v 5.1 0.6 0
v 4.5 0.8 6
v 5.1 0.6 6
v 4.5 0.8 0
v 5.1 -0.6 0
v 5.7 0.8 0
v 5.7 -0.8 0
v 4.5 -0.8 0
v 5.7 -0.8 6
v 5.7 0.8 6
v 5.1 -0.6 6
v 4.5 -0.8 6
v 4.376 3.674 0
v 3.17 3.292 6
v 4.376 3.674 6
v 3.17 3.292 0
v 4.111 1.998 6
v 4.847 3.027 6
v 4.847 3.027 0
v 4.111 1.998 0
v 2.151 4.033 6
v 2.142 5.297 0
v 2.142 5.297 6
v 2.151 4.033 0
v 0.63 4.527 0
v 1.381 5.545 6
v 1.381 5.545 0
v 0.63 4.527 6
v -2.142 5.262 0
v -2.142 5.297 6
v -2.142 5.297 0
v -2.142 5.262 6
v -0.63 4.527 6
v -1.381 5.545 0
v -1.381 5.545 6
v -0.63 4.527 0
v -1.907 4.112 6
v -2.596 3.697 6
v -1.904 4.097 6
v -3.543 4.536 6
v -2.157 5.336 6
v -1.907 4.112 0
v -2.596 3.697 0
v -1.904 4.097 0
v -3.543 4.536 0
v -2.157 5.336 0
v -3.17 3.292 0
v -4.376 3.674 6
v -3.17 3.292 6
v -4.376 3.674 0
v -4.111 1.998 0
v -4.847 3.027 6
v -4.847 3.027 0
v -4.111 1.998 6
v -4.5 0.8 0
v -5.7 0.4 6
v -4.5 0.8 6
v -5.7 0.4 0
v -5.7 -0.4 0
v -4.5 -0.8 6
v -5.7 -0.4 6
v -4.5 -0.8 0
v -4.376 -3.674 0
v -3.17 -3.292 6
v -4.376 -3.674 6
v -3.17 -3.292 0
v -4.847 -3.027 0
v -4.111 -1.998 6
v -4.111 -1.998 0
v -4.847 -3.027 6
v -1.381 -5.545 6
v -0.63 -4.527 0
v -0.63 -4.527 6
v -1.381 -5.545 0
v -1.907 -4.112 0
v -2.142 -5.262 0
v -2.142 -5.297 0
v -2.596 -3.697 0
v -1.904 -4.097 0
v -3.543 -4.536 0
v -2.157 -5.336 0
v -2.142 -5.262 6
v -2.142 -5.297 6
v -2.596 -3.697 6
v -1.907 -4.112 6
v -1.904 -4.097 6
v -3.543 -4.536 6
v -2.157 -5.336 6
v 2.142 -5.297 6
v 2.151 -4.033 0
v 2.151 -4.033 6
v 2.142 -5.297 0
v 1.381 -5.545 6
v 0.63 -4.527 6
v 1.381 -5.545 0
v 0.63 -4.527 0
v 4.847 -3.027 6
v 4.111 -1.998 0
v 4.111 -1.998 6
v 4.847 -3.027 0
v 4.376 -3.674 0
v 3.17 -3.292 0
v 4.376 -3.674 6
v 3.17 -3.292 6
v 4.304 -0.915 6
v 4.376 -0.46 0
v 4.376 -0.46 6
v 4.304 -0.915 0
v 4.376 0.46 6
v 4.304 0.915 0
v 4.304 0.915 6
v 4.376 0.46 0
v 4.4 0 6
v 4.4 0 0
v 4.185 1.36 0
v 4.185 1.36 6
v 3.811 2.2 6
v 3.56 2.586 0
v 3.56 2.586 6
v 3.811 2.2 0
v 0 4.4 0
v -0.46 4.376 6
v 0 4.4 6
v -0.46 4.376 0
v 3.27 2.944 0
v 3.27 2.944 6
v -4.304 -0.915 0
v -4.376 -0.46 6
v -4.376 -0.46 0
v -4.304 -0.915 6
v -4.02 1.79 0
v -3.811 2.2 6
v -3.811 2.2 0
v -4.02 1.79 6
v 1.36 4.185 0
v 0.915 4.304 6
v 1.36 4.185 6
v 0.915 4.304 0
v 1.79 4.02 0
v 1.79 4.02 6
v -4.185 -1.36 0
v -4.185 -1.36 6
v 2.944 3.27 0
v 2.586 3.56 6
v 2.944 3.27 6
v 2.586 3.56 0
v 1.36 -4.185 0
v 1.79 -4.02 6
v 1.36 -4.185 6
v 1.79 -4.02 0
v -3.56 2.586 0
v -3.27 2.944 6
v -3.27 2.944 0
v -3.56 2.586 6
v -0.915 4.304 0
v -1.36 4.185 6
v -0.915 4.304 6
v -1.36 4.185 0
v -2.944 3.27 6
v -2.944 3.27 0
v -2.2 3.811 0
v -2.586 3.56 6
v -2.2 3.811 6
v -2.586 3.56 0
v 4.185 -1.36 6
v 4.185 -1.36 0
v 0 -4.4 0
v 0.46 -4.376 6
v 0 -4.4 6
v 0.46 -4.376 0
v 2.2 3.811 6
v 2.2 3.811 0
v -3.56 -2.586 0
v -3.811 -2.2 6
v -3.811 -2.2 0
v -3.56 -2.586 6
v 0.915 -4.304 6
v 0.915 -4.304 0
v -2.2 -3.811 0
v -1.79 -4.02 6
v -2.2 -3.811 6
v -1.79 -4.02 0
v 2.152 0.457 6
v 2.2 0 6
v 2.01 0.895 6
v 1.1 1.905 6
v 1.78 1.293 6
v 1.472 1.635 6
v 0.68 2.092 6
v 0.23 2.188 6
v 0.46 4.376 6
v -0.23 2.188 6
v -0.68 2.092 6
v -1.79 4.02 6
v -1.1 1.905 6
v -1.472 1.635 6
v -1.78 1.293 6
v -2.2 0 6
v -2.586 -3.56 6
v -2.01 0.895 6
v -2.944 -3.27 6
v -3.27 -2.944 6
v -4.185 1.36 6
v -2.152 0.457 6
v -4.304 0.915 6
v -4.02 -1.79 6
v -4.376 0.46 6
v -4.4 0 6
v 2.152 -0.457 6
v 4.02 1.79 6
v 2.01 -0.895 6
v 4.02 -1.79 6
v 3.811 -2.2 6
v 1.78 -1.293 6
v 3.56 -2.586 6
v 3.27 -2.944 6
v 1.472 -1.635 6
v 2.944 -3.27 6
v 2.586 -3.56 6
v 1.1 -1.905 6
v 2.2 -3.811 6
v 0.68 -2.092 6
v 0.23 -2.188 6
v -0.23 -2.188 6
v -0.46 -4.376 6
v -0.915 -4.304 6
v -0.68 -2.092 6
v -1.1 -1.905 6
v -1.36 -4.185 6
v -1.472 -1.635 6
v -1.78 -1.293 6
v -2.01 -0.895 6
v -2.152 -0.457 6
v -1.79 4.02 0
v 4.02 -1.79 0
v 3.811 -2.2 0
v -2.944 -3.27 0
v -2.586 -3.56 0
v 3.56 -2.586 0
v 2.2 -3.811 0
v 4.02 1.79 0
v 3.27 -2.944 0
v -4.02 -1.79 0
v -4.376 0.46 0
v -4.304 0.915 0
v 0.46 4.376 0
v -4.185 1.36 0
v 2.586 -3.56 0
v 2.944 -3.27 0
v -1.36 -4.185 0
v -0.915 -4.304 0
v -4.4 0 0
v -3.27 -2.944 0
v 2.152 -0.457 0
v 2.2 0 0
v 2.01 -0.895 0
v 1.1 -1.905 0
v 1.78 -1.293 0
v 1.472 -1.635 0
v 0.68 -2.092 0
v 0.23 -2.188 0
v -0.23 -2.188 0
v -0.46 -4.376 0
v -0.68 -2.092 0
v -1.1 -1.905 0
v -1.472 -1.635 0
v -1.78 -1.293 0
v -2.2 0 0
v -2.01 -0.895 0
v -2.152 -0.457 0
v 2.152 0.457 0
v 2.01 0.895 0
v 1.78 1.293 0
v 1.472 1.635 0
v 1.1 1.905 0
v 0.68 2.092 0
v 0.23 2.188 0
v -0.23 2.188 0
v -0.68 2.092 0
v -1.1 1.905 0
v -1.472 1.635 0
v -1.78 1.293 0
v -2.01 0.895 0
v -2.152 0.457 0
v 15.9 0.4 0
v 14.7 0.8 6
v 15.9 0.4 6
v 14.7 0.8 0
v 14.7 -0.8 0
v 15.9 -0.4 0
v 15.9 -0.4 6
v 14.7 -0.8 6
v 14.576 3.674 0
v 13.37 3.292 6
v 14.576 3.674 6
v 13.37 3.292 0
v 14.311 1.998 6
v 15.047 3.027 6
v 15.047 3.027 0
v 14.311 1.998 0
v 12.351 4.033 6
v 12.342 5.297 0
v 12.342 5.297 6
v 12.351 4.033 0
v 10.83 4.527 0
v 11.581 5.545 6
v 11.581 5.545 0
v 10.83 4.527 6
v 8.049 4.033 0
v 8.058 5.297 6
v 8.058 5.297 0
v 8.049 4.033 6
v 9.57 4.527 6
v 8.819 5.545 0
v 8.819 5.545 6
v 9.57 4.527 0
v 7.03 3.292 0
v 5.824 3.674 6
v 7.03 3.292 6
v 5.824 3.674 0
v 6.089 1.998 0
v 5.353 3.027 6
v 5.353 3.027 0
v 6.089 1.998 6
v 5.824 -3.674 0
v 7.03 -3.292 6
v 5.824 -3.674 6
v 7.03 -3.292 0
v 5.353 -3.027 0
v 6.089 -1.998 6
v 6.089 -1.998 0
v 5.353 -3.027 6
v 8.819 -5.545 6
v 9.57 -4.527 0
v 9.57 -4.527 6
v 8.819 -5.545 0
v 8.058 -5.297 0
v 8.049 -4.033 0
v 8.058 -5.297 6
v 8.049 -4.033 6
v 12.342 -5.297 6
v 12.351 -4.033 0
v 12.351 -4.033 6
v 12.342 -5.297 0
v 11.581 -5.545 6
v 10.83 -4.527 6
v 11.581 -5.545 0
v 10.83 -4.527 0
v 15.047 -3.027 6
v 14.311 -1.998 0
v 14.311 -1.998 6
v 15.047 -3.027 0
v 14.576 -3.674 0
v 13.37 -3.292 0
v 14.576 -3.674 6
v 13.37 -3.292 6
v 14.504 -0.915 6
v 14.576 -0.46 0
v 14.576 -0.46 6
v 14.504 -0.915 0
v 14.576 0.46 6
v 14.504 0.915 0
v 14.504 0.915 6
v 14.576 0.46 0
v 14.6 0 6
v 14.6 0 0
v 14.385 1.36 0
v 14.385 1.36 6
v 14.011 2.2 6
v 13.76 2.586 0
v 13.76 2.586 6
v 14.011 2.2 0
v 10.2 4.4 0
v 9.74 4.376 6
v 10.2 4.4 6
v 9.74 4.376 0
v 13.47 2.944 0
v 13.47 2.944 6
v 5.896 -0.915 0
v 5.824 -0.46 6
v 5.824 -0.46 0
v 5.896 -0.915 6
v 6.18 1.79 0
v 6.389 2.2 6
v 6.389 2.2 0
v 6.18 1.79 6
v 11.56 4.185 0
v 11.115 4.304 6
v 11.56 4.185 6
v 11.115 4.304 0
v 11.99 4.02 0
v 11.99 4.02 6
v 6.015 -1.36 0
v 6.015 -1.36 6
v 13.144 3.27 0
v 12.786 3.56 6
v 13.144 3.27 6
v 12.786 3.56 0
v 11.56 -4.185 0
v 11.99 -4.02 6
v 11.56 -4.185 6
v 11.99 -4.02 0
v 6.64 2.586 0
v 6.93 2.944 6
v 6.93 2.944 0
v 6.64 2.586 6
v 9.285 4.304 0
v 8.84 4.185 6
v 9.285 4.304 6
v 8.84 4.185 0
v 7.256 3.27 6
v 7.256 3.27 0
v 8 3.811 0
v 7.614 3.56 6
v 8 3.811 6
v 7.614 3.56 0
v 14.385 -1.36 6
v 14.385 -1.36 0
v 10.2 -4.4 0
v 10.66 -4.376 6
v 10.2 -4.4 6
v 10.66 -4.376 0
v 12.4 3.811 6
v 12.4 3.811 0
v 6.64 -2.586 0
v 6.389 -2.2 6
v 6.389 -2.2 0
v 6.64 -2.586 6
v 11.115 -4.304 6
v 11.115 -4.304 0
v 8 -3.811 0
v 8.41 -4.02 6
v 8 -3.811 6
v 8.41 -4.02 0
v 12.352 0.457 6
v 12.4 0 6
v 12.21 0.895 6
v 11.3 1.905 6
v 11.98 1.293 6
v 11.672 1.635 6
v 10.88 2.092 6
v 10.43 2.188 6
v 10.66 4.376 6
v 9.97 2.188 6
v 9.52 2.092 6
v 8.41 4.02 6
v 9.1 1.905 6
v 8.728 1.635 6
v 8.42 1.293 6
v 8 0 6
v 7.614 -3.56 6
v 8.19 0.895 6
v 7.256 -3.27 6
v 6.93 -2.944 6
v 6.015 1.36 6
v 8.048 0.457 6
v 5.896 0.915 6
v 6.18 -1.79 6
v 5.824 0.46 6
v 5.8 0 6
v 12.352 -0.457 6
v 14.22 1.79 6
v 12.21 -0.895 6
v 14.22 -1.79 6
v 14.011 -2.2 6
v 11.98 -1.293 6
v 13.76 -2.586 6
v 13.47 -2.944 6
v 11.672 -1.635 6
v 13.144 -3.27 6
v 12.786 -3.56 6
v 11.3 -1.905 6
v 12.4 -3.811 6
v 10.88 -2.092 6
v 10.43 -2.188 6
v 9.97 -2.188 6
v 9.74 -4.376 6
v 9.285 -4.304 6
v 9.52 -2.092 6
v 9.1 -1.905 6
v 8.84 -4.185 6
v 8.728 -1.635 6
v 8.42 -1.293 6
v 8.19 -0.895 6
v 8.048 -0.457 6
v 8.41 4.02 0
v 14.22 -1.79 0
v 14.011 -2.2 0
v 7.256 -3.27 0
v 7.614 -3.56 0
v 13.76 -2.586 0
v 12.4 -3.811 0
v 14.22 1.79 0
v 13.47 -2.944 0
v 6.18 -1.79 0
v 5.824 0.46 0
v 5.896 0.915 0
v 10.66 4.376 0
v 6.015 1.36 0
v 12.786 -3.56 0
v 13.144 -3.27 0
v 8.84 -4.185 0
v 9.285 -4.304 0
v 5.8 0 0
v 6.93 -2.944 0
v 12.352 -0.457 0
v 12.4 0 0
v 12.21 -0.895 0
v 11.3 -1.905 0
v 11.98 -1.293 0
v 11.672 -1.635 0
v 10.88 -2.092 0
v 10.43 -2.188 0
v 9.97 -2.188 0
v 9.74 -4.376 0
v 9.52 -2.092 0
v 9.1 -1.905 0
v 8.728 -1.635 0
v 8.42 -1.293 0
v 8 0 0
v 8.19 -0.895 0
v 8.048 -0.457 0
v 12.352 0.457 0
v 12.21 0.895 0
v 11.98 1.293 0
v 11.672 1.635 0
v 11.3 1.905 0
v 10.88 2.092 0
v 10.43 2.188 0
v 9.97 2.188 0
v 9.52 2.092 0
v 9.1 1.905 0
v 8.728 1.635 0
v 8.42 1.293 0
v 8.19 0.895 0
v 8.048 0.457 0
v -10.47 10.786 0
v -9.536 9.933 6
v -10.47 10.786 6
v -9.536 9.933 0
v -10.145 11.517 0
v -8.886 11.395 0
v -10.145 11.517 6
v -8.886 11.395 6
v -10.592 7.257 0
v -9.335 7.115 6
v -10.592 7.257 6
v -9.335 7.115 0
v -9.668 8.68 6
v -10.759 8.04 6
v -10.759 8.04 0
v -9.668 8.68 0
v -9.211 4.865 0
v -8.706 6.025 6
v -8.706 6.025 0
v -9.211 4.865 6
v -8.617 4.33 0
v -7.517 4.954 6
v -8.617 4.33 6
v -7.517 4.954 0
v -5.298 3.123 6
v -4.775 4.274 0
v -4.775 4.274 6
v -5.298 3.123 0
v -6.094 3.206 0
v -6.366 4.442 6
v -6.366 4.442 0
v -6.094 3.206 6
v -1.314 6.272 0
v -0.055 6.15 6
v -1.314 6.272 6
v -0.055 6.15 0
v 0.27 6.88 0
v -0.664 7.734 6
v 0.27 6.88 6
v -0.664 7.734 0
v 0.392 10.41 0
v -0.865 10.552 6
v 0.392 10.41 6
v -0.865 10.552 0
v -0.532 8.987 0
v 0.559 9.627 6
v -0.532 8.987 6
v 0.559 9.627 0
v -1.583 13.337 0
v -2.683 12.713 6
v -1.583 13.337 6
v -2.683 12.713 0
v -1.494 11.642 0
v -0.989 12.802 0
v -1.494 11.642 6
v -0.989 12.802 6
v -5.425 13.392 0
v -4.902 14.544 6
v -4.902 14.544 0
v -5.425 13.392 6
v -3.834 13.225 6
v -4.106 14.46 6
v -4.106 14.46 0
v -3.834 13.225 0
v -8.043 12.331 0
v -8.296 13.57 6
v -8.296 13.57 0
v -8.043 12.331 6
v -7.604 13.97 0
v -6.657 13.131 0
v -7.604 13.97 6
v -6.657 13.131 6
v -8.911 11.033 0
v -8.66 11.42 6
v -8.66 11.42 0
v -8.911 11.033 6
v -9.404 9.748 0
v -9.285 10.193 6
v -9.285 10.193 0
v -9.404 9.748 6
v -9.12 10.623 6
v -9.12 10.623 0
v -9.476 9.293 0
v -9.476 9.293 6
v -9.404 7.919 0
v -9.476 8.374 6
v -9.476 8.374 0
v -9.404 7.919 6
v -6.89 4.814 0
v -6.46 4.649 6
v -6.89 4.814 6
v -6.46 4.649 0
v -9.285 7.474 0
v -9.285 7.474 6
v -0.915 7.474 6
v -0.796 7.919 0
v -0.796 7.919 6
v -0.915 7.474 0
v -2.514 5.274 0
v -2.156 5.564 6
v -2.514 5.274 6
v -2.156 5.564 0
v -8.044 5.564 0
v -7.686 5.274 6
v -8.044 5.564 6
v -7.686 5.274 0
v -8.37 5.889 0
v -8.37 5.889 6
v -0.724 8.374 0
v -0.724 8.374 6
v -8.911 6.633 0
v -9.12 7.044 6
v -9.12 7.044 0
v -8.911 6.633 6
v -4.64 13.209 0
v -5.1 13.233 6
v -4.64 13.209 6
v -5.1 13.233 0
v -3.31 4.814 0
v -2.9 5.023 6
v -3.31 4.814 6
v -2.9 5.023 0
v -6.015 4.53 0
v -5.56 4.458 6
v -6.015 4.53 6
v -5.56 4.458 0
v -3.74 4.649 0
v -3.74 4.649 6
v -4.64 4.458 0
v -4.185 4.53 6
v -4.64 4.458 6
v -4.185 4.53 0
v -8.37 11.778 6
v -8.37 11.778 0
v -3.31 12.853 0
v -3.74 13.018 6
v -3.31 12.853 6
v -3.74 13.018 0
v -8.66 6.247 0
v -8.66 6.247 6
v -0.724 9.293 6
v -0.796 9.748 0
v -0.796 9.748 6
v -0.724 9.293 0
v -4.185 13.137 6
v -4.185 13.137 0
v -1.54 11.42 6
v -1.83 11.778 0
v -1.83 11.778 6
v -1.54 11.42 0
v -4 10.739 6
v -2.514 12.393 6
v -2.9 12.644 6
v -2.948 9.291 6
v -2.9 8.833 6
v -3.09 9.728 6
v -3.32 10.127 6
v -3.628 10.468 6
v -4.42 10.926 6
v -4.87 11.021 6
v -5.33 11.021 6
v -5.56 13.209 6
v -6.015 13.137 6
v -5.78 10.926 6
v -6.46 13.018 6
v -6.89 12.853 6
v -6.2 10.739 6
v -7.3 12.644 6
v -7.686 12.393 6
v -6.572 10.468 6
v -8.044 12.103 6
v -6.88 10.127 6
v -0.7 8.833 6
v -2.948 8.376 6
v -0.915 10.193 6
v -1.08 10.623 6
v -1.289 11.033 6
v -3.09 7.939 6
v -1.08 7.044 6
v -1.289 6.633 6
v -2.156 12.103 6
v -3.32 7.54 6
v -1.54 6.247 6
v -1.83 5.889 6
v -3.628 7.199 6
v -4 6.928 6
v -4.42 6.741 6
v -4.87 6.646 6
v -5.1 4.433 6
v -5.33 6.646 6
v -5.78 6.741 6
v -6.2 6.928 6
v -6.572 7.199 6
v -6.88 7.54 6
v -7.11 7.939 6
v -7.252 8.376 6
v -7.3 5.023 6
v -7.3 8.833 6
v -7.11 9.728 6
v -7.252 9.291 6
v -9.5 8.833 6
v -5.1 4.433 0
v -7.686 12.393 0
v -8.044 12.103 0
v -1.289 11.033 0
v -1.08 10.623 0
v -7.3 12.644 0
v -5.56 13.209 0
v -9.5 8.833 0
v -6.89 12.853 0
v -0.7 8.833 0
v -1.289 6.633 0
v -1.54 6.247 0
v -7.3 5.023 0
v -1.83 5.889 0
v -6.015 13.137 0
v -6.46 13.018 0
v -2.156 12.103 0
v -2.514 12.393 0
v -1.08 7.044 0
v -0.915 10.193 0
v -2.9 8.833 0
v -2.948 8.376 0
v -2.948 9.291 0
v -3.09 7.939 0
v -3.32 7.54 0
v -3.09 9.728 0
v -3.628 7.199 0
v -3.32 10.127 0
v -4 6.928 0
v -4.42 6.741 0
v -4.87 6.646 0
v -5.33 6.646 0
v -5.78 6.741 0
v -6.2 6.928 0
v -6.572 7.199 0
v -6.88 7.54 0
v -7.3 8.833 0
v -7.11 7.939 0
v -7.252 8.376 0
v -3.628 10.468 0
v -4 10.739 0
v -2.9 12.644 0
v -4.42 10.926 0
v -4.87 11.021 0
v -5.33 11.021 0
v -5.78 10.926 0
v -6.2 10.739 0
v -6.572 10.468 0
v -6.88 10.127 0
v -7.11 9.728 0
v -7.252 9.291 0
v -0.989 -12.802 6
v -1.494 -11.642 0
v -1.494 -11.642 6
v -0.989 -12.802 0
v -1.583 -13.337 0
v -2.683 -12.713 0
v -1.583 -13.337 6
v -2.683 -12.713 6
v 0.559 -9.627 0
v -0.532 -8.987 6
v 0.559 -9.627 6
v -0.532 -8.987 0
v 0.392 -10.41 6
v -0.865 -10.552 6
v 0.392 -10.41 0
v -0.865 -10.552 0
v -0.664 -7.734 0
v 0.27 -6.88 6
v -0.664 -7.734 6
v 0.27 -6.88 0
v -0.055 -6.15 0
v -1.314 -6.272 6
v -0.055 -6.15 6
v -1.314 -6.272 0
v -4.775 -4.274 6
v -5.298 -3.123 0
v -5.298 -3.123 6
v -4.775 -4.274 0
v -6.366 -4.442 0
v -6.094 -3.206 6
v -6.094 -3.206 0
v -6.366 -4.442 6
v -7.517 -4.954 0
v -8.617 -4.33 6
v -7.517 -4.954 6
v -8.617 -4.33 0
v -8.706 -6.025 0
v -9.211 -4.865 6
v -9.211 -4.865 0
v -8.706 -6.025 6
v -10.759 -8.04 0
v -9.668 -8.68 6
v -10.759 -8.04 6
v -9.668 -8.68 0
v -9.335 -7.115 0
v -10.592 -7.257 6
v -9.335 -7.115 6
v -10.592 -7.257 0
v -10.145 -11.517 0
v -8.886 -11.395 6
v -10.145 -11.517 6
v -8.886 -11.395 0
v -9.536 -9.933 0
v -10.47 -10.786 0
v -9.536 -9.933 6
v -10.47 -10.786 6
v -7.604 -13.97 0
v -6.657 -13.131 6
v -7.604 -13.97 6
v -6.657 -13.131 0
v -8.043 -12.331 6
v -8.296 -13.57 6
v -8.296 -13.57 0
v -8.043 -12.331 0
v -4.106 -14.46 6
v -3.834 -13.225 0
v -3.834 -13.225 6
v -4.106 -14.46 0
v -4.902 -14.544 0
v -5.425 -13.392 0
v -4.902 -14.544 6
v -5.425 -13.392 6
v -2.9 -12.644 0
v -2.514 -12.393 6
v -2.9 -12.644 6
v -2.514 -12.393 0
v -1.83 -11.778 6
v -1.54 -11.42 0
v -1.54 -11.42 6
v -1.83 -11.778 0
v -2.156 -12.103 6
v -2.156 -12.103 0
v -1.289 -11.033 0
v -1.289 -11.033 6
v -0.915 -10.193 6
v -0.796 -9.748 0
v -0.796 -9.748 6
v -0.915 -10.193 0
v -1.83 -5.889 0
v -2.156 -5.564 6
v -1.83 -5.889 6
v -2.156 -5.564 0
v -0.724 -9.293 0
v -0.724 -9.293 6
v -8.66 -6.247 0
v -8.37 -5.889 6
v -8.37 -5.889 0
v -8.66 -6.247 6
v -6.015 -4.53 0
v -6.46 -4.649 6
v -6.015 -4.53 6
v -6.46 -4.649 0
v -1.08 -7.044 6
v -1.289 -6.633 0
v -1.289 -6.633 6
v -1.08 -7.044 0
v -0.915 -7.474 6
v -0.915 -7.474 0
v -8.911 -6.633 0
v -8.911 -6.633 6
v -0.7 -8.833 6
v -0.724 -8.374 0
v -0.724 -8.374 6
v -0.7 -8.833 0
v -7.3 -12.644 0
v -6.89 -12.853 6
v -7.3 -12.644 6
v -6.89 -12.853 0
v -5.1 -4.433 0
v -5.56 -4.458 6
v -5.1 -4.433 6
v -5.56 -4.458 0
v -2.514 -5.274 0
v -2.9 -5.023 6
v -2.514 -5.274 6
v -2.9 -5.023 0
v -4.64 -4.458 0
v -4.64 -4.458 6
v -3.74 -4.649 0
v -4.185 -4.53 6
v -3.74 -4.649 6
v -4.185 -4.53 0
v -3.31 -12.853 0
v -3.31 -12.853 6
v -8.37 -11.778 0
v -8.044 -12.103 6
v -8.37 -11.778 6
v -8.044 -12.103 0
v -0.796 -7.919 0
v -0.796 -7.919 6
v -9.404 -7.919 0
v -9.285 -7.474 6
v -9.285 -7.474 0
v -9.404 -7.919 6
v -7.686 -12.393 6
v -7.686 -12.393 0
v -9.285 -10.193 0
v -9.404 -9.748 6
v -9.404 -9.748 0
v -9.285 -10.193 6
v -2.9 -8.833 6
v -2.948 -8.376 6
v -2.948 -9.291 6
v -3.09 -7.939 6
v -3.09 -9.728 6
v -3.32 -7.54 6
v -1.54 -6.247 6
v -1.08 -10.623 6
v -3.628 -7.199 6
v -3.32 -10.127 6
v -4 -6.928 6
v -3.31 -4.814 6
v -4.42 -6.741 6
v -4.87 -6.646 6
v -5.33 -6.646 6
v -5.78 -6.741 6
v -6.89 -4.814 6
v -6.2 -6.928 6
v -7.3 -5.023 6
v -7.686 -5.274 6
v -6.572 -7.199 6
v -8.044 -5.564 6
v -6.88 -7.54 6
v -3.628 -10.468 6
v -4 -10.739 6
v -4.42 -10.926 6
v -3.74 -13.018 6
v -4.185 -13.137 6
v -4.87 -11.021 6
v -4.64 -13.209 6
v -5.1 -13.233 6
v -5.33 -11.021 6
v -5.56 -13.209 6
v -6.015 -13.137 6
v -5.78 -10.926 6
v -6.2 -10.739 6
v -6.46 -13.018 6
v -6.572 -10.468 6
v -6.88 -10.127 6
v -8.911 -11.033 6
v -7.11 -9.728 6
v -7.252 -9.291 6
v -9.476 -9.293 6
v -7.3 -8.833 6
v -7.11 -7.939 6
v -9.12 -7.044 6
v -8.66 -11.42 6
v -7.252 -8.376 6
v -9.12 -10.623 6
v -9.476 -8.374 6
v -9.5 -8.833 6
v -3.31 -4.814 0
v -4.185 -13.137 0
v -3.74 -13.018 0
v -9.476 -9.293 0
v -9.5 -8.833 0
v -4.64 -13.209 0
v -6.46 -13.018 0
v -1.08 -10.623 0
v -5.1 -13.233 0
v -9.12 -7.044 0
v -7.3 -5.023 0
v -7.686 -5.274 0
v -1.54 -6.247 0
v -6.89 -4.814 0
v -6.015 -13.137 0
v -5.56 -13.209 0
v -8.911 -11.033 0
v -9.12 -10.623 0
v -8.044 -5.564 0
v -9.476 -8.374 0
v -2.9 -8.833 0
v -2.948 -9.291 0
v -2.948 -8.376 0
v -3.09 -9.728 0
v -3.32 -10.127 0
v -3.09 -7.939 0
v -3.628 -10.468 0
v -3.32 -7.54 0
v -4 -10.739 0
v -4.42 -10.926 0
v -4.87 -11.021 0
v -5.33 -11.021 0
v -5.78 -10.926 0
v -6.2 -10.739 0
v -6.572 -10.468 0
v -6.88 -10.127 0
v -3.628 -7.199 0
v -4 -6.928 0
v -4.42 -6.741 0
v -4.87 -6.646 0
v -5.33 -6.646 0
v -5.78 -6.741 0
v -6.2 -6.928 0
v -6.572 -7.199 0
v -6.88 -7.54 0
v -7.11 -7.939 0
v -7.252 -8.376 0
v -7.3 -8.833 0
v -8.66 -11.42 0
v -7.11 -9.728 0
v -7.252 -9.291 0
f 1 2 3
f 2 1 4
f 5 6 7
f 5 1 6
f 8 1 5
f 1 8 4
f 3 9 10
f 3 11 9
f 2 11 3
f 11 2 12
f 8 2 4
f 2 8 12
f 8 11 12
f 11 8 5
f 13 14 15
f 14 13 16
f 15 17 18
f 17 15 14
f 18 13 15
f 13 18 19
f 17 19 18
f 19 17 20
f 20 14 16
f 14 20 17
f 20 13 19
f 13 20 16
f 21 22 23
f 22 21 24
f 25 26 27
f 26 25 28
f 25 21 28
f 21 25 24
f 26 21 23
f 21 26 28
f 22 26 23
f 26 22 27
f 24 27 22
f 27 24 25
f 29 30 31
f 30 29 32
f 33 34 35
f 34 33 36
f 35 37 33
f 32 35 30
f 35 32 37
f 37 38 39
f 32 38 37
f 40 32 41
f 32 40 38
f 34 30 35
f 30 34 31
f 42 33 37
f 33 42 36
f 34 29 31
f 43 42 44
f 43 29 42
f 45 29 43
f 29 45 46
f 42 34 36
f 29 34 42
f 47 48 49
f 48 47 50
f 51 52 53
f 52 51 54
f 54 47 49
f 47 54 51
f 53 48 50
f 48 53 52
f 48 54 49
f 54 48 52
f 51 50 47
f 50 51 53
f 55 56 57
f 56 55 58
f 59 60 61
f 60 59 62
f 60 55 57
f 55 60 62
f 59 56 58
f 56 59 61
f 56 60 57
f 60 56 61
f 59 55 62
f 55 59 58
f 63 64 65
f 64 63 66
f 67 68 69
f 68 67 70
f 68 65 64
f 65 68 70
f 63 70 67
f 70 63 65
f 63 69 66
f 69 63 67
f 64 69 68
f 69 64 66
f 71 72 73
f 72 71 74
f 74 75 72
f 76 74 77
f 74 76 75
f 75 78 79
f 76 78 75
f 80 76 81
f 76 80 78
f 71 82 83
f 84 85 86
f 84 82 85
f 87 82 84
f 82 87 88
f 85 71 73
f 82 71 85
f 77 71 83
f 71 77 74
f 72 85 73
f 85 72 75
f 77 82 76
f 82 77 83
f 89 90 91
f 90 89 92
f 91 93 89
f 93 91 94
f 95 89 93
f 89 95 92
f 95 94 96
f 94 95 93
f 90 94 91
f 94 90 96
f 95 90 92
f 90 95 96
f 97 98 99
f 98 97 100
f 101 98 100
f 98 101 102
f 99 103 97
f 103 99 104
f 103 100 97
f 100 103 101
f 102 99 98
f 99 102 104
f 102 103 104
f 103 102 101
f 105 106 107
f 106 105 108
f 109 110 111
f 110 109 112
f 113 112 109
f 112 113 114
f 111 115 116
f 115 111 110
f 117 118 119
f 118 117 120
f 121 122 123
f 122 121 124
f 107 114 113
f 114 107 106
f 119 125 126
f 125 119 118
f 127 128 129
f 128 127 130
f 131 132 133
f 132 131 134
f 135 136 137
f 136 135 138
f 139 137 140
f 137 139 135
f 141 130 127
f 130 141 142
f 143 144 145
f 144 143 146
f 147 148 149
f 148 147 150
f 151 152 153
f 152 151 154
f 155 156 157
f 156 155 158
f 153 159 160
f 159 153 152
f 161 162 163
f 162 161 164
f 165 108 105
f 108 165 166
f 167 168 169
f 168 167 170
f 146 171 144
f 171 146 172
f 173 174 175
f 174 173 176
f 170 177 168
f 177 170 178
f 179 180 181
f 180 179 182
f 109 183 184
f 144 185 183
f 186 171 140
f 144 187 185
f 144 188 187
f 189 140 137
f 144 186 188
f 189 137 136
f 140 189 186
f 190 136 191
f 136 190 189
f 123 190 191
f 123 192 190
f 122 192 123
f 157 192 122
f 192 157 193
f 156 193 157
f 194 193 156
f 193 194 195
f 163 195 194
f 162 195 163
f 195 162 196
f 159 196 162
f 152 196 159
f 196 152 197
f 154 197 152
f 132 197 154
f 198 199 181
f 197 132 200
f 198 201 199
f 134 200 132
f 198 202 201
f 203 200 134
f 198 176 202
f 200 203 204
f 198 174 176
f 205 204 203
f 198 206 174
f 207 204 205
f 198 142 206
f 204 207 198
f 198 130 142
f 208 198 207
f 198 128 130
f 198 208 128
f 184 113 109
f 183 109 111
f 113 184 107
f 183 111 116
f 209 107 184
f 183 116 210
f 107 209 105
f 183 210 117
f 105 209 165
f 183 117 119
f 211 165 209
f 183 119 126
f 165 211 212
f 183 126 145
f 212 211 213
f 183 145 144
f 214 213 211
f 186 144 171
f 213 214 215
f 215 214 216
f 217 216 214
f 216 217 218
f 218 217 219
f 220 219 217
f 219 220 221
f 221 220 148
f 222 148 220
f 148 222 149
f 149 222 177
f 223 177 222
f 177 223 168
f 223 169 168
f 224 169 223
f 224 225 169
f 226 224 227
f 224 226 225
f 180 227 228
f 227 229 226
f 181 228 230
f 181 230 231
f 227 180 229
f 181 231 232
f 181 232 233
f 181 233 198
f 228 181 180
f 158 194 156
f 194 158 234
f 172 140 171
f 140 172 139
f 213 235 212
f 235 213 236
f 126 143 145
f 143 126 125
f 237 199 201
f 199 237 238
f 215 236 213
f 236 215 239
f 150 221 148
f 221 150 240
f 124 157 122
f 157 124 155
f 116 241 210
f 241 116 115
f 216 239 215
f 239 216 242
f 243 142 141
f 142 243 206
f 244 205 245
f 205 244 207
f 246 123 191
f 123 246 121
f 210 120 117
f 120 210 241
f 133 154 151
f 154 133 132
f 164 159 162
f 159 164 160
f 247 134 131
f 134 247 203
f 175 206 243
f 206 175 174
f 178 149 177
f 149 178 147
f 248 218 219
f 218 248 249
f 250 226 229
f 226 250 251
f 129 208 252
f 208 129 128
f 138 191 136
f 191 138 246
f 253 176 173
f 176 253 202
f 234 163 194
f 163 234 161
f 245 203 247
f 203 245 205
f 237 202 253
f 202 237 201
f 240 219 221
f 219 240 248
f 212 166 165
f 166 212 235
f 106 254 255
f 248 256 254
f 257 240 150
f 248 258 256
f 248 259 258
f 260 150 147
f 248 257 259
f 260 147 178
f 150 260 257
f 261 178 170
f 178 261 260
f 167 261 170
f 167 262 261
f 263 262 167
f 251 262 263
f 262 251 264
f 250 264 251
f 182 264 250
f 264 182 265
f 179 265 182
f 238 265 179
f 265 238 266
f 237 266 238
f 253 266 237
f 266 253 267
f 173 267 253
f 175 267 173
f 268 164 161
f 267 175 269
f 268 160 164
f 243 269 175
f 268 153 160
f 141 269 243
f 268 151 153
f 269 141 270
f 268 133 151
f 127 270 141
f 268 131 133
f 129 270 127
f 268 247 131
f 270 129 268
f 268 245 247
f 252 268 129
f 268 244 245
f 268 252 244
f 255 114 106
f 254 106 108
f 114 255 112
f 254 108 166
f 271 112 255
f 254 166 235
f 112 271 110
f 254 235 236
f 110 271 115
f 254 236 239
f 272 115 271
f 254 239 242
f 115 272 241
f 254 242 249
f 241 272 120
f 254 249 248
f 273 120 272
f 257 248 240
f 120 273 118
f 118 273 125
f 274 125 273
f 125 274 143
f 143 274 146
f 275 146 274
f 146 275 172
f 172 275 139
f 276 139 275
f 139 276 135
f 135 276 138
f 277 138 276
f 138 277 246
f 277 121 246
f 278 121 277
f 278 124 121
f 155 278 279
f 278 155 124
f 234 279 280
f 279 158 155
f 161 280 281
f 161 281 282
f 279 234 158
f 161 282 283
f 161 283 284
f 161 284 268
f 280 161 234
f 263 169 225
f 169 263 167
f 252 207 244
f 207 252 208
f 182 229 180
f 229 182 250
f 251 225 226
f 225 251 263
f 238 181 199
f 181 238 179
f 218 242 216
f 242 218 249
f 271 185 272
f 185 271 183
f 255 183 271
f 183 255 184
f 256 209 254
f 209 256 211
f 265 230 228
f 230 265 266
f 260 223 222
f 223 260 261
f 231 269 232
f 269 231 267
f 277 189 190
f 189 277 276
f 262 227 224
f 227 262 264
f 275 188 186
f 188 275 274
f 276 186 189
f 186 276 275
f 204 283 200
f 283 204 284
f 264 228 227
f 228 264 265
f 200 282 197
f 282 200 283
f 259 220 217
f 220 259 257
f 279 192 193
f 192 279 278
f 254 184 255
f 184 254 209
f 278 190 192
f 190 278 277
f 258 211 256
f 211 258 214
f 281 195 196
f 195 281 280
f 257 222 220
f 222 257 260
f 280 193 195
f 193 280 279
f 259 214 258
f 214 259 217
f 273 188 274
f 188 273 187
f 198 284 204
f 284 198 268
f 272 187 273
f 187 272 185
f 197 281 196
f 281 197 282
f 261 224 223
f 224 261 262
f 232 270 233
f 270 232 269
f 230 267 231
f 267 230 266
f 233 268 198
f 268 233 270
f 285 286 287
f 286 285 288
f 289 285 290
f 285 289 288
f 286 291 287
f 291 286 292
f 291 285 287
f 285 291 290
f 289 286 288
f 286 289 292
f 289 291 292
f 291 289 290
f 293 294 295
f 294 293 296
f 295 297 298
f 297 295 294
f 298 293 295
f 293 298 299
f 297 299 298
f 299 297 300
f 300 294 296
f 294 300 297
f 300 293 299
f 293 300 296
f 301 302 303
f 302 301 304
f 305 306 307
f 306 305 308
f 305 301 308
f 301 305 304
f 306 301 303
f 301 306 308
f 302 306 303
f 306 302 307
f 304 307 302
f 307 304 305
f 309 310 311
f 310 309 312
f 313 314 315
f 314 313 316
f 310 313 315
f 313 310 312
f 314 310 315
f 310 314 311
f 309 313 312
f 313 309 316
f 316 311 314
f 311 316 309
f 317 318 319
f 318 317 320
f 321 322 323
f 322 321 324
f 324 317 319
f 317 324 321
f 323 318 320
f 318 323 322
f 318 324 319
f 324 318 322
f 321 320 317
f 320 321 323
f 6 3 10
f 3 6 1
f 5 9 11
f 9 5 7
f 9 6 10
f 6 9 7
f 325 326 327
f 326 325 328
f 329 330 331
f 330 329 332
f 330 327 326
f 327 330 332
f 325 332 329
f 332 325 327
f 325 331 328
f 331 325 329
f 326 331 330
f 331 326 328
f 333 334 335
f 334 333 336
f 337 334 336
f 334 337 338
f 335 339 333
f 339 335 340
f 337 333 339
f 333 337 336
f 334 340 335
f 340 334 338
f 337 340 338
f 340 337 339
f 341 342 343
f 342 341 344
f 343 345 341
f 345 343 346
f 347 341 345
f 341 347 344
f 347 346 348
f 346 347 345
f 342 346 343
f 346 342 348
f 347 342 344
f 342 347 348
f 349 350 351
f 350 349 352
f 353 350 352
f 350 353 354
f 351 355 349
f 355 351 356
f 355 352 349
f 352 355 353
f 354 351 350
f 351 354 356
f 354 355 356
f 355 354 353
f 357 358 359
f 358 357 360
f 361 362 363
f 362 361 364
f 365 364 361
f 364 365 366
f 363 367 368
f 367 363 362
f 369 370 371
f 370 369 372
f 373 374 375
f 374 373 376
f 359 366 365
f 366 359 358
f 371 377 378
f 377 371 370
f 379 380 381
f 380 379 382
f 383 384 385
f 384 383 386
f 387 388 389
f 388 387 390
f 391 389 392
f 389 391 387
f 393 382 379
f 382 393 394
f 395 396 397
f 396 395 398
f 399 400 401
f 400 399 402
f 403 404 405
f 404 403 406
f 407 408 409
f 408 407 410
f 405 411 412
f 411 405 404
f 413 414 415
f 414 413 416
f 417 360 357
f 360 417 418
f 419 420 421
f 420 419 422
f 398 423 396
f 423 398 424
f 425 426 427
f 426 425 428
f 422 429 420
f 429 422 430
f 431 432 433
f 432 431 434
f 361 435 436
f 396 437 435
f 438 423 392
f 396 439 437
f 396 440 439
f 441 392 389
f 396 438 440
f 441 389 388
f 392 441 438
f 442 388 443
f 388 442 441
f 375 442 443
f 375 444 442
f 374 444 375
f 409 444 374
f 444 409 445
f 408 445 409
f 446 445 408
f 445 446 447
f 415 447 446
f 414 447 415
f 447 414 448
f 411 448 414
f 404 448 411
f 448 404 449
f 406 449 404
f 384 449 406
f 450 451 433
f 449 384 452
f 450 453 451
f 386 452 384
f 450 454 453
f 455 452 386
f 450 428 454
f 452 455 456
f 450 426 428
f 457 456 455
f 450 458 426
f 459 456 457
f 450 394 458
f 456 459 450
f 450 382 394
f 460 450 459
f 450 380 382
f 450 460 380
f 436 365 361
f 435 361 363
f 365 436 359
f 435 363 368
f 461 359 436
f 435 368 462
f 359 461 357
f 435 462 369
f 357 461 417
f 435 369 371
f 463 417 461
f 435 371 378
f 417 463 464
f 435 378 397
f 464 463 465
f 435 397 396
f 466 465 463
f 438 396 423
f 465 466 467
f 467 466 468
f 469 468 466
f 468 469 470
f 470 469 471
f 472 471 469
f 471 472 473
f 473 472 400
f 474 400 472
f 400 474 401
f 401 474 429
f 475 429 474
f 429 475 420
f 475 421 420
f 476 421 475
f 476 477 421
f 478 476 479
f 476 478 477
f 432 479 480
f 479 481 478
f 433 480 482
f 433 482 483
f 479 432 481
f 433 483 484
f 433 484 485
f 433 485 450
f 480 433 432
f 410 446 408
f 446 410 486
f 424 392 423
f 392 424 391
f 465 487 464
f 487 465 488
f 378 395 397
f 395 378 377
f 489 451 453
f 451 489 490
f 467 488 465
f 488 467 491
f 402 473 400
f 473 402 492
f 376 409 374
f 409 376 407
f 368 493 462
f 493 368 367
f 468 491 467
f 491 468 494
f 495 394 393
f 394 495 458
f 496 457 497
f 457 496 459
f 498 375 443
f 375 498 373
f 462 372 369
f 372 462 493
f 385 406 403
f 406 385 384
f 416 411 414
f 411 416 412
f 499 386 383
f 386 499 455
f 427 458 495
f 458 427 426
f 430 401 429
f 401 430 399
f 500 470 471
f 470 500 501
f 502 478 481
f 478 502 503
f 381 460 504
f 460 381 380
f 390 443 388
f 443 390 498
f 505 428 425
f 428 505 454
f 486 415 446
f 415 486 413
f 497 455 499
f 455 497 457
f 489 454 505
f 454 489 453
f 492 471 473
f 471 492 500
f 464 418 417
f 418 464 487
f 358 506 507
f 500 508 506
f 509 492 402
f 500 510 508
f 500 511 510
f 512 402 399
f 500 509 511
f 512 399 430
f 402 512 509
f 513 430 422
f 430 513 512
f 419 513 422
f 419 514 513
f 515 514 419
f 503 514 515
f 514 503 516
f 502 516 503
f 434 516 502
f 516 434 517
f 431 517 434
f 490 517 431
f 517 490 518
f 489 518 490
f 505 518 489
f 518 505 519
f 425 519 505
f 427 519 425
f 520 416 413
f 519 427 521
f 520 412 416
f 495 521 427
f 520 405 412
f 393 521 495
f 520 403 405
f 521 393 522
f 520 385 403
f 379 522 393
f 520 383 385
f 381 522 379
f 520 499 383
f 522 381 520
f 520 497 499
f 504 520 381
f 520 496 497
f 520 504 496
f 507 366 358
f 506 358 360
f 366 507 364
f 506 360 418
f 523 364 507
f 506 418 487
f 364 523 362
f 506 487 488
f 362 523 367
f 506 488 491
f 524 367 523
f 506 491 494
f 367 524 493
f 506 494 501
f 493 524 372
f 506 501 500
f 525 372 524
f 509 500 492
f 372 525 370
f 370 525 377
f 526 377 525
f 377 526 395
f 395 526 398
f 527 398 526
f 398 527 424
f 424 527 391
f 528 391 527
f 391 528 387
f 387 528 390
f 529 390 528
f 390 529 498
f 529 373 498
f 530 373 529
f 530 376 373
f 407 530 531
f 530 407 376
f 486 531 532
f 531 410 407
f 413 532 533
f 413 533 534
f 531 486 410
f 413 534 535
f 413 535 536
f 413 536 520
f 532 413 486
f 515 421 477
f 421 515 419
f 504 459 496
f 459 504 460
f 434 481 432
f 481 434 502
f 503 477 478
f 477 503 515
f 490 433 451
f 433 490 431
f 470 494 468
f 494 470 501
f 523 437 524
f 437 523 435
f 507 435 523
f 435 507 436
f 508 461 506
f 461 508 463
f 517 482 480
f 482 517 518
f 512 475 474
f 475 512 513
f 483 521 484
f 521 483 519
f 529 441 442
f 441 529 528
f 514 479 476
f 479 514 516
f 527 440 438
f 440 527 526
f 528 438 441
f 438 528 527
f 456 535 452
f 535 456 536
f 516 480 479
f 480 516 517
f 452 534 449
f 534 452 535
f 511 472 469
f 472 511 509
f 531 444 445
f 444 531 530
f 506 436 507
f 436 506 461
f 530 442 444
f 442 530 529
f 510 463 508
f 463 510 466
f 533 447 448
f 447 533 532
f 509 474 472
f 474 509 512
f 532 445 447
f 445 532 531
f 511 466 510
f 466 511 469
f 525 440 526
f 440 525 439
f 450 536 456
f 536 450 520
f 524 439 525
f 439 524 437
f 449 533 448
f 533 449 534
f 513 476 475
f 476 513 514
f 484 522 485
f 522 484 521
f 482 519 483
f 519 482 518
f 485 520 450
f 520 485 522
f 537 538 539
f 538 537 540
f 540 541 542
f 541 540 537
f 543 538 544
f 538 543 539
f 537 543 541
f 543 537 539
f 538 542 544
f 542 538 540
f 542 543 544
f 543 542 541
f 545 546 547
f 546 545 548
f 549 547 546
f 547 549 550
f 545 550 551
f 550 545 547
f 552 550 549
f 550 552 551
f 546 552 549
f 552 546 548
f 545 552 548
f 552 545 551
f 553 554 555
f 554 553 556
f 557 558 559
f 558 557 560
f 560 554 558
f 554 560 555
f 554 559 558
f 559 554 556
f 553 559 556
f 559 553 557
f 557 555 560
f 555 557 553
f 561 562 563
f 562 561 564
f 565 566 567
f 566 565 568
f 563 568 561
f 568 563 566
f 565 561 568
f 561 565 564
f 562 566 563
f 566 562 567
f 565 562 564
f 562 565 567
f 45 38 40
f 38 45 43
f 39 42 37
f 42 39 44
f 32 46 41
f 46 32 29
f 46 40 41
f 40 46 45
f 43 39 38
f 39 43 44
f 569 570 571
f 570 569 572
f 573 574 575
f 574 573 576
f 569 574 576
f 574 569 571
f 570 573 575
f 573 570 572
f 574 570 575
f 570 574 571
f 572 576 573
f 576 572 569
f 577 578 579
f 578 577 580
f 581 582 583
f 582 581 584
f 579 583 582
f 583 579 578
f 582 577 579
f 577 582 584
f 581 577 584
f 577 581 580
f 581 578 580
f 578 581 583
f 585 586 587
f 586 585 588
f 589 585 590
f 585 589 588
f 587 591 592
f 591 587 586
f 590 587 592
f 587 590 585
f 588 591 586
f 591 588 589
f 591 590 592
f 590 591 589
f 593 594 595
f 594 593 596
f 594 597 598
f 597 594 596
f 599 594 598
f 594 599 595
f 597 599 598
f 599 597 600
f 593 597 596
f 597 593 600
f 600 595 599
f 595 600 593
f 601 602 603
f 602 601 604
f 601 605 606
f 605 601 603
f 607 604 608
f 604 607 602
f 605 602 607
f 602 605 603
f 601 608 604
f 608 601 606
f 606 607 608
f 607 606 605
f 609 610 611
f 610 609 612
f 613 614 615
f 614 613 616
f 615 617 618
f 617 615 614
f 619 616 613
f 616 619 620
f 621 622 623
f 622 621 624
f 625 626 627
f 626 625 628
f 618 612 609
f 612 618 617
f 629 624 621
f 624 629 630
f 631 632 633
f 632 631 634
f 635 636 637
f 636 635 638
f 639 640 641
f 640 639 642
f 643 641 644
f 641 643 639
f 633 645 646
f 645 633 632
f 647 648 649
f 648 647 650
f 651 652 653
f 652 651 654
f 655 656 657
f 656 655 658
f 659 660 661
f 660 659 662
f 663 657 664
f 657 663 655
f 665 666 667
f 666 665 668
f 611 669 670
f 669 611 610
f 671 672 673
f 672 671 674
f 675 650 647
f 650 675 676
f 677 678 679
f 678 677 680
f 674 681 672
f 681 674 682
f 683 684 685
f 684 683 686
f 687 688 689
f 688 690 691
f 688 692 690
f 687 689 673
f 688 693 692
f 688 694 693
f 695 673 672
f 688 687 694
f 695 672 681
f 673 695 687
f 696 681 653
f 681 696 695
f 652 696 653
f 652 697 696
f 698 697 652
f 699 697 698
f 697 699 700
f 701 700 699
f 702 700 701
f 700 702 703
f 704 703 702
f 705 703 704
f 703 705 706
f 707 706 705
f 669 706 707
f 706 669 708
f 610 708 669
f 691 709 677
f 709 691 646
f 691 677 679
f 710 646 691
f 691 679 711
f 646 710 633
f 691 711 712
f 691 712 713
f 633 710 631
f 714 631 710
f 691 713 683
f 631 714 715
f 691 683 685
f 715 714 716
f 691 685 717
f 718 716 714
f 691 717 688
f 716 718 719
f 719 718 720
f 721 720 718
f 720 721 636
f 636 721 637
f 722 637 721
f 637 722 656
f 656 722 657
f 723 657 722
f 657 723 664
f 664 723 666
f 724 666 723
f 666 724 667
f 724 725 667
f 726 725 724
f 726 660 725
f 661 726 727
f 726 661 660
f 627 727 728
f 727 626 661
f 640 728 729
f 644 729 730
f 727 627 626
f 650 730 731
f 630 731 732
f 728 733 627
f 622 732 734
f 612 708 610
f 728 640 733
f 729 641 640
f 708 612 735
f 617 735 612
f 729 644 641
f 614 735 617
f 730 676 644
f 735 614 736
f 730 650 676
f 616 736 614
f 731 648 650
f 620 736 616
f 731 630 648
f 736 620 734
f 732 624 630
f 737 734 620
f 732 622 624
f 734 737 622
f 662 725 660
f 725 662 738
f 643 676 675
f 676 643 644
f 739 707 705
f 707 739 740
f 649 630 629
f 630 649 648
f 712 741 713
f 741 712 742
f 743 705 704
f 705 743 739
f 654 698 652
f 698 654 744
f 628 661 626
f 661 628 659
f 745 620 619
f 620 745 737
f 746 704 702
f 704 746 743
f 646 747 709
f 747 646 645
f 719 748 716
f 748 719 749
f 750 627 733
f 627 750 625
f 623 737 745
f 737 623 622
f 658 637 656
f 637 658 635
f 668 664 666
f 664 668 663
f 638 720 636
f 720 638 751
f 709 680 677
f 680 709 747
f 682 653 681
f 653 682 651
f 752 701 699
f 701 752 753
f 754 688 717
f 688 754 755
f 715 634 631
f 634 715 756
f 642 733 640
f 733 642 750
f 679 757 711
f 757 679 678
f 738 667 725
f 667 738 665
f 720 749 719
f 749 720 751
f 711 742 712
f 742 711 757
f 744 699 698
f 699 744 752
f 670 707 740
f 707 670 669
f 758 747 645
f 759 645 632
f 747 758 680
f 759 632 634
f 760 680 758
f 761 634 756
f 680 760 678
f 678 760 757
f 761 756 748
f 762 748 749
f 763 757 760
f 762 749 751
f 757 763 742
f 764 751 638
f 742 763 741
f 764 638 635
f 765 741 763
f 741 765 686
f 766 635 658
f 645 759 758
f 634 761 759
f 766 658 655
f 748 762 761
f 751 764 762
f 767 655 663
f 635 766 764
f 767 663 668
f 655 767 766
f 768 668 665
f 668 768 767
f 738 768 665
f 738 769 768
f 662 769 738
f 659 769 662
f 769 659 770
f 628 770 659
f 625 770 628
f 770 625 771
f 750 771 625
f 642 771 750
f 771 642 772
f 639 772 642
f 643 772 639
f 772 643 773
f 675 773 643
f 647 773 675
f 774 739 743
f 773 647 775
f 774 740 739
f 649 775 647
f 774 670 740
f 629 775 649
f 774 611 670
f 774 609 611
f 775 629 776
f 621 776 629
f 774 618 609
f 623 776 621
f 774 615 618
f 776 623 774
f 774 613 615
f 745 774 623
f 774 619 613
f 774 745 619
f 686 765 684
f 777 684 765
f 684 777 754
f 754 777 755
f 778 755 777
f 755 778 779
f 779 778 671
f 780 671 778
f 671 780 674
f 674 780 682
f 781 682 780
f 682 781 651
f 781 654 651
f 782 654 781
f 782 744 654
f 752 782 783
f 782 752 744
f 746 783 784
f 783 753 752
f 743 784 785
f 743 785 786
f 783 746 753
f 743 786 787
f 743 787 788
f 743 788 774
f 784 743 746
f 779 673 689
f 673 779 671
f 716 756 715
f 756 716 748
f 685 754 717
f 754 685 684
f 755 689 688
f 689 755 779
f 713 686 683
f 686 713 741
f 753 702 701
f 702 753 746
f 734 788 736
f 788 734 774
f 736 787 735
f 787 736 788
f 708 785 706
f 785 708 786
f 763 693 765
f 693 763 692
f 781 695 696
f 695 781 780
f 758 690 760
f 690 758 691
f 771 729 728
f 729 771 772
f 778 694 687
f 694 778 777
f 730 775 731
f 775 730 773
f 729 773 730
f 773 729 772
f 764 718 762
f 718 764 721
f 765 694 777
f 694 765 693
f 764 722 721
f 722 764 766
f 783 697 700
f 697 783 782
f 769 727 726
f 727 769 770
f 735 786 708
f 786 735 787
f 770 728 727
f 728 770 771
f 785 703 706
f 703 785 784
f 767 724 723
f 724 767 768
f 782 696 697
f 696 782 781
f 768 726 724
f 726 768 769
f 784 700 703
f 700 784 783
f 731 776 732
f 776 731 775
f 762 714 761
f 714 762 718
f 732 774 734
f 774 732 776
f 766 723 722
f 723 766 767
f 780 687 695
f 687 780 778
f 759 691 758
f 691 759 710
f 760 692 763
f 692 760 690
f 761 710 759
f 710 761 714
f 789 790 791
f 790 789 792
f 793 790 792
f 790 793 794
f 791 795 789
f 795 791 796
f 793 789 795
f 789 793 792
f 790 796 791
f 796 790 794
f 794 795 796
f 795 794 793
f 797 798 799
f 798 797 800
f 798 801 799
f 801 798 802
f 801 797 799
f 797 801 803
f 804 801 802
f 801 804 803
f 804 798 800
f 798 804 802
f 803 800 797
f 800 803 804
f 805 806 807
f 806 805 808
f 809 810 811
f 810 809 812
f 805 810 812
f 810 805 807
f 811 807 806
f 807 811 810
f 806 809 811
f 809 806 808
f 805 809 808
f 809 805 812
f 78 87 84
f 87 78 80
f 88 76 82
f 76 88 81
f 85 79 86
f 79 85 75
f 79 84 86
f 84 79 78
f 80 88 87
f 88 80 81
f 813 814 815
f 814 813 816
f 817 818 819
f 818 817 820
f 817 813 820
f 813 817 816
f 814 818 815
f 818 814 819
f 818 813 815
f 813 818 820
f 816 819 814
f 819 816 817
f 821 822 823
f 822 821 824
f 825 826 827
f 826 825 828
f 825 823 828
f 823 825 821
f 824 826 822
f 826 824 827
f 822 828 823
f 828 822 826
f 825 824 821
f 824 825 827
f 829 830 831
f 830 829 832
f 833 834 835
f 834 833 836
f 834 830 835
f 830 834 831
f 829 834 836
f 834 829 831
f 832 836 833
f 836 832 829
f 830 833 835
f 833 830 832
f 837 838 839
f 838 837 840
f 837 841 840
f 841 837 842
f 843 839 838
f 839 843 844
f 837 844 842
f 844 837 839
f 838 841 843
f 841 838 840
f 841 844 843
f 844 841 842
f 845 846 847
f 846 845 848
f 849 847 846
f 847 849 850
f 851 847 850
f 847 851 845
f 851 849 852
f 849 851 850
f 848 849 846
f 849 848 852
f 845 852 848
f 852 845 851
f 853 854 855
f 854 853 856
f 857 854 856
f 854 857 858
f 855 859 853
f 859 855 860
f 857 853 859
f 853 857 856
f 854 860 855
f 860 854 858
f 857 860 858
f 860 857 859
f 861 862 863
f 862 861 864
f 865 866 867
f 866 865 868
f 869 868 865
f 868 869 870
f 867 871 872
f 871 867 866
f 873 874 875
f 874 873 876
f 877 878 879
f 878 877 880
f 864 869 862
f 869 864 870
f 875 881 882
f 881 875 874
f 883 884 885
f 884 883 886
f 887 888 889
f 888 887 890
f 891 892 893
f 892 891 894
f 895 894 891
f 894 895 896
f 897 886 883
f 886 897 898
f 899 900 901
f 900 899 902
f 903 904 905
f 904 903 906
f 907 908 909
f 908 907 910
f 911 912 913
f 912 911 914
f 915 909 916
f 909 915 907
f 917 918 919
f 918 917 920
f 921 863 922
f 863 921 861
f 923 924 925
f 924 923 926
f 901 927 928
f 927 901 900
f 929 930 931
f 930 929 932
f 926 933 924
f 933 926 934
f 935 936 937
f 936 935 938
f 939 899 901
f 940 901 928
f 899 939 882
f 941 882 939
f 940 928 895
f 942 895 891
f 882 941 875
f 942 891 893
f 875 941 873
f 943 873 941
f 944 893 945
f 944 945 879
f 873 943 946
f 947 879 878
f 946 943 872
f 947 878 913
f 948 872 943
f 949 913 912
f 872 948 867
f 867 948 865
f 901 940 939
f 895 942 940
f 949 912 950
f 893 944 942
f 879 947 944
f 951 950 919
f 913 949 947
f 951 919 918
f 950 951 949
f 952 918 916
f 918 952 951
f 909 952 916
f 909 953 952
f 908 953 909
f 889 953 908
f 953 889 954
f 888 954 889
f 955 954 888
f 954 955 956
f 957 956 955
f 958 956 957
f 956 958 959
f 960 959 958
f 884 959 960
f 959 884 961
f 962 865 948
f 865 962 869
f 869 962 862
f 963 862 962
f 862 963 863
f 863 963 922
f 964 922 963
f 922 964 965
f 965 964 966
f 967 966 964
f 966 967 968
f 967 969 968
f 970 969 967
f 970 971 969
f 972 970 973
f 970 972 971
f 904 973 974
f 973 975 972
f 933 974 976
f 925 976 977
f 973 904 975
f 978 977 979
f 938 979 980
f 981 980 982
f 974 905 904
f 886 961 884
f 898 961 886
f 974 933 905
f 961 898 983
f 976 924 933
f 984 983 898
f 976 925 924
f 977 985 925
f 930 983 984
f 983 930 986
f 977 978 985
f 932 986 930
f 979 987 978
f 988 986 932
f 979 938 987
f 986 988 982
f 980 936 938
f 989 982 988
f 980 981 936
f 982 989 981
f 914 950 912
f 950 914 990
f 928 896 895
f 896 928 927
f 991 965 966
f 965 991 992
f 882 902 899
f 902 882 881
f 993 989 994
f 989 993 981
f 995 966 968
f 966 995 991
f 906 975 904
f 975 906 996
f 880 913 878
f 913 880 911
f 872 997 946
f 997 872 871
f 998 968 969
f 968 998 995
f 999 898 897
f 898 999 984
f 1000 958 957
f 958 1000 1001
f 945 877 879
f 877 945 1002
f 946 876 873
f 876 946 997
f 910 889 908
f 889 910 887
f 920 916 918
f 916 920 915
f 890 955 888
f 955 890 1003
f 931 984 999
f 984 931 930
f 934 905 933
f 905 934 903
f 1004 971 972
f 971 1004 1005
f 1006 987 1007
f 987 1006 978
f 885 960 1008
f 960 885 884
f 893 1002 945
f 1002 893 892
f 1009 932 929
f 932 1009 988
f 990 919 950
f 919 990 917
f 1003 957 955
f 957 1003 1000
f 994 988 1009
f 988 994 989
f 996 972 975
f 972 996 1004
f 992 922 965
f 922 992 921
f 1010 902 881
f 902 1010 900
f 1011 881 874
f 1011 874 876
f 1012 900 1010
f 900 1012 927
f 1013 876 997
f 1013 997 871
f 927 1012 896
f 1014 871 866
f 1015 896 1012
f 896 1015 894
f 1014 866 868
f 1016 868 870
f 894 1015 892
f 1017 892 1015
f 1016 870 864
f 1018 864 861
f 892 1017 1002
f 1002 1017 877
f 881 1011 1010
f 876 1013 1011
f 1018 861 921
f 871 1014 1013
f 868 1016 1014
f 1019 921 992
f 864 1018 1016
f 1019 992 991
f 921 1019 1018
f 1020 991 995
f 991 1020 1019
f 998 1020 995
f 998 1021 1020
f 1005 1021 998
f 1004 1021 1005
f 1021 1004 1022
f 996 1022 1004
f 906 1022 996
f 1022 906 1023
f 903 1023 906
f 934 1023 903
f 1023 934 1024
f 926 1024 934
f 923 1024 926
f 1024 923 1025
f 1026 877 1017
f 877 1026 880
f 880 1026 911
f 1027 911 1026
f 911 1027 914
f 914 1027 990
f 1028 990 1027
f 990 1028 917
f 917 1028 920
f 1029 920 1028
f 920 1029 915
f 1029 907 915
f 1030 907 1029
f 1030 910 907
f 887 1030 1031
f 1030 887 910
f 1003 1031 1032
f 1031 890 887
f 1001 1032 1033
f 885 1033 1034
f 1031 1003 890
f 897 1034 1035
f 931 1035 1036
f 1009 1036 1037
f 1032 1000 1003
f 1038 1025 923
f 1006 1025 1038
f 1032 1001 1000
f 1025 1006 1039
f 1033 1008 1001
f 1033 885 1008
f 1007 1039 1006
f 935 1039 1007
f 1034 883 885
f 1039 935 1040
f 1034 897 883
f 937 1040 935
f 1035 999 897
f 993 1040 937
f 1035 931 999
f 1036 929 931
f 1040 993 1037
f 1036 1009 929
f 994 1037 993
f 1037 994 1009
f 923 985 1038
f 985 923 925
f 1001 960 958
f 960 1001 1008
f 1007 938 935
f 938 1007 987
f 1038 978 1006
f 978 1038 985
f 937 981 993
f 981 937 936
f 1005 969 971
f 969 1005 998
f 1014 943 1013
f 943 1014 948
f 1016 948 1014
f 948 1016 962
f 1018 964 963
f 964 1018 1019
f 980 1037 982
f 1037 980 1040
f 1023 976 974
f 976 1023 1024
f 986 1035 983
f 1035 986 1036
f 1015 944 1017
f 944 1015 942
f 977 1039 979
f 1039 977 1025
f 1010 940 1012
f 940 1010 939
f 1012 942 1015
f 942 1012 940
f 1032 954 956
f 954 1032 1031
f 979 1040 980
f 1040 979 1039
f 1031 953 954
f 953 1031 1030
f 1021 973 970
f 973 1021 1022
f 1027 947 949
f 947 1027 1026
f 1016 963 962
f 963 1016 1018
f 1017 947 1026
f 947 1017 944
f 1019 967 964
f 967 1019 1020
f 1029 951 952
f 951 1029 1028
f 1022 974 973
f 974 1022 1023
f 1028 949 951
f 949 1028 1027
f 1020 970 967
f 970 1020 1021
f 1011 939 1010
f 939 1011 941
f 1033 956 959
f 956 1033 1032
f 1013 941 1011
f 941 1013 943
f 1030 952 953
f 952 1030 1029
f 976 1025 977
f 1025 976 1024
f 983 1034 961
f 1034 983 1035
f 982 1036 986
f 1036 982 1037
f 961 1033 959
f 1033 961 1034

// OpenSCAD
// Strictly isolated cogs with zero case code

gear_thickness = 6;
pip_gap = 0.2;
r_sun = 5.0;
r_planet = 5.0;
center_dist = r_sun + r_planet + pip_gap;

module proper_gear(teeth, r_pitch) {
    union() {
        cylinder(h=gear_thickness, r=r_pitch - 0.6, $fn=60);
        for (i = [0 : teeth - 1]) {
            rotate([0, 0, i * (360 / teeth)])
                translate([r_pitch - 0.5, 0, 0])
                    linear_extrude(height=gear_thickness)
                        polygon(points=[
                            [0, -0.8],
                            [1.2, -0.4],
                            [1.2, 0.4],
                            [0, 0.8]
                        ]);
        }
    }
}

// Central Sun Gear
translate([0, 0, 0]) {
    difference() {
        proper_gear(10, r_sun);
        cylinder(h=gear_thickness + 2, r=2.0 + pip_gap, $fn=30);
    }
}

// Planet Gears
for (i = [0 : 2]) {
    rotate([0, 0, i * 120])
        translate([center_dist, 0, 0])
            rotate([0, 0, i * 36])
            difference() {
                proper_gear(10, r_planet);
                cylinder(h=gear_thickness + 2, r=2.0 + pip_gap, $fn=30);
            }
}
